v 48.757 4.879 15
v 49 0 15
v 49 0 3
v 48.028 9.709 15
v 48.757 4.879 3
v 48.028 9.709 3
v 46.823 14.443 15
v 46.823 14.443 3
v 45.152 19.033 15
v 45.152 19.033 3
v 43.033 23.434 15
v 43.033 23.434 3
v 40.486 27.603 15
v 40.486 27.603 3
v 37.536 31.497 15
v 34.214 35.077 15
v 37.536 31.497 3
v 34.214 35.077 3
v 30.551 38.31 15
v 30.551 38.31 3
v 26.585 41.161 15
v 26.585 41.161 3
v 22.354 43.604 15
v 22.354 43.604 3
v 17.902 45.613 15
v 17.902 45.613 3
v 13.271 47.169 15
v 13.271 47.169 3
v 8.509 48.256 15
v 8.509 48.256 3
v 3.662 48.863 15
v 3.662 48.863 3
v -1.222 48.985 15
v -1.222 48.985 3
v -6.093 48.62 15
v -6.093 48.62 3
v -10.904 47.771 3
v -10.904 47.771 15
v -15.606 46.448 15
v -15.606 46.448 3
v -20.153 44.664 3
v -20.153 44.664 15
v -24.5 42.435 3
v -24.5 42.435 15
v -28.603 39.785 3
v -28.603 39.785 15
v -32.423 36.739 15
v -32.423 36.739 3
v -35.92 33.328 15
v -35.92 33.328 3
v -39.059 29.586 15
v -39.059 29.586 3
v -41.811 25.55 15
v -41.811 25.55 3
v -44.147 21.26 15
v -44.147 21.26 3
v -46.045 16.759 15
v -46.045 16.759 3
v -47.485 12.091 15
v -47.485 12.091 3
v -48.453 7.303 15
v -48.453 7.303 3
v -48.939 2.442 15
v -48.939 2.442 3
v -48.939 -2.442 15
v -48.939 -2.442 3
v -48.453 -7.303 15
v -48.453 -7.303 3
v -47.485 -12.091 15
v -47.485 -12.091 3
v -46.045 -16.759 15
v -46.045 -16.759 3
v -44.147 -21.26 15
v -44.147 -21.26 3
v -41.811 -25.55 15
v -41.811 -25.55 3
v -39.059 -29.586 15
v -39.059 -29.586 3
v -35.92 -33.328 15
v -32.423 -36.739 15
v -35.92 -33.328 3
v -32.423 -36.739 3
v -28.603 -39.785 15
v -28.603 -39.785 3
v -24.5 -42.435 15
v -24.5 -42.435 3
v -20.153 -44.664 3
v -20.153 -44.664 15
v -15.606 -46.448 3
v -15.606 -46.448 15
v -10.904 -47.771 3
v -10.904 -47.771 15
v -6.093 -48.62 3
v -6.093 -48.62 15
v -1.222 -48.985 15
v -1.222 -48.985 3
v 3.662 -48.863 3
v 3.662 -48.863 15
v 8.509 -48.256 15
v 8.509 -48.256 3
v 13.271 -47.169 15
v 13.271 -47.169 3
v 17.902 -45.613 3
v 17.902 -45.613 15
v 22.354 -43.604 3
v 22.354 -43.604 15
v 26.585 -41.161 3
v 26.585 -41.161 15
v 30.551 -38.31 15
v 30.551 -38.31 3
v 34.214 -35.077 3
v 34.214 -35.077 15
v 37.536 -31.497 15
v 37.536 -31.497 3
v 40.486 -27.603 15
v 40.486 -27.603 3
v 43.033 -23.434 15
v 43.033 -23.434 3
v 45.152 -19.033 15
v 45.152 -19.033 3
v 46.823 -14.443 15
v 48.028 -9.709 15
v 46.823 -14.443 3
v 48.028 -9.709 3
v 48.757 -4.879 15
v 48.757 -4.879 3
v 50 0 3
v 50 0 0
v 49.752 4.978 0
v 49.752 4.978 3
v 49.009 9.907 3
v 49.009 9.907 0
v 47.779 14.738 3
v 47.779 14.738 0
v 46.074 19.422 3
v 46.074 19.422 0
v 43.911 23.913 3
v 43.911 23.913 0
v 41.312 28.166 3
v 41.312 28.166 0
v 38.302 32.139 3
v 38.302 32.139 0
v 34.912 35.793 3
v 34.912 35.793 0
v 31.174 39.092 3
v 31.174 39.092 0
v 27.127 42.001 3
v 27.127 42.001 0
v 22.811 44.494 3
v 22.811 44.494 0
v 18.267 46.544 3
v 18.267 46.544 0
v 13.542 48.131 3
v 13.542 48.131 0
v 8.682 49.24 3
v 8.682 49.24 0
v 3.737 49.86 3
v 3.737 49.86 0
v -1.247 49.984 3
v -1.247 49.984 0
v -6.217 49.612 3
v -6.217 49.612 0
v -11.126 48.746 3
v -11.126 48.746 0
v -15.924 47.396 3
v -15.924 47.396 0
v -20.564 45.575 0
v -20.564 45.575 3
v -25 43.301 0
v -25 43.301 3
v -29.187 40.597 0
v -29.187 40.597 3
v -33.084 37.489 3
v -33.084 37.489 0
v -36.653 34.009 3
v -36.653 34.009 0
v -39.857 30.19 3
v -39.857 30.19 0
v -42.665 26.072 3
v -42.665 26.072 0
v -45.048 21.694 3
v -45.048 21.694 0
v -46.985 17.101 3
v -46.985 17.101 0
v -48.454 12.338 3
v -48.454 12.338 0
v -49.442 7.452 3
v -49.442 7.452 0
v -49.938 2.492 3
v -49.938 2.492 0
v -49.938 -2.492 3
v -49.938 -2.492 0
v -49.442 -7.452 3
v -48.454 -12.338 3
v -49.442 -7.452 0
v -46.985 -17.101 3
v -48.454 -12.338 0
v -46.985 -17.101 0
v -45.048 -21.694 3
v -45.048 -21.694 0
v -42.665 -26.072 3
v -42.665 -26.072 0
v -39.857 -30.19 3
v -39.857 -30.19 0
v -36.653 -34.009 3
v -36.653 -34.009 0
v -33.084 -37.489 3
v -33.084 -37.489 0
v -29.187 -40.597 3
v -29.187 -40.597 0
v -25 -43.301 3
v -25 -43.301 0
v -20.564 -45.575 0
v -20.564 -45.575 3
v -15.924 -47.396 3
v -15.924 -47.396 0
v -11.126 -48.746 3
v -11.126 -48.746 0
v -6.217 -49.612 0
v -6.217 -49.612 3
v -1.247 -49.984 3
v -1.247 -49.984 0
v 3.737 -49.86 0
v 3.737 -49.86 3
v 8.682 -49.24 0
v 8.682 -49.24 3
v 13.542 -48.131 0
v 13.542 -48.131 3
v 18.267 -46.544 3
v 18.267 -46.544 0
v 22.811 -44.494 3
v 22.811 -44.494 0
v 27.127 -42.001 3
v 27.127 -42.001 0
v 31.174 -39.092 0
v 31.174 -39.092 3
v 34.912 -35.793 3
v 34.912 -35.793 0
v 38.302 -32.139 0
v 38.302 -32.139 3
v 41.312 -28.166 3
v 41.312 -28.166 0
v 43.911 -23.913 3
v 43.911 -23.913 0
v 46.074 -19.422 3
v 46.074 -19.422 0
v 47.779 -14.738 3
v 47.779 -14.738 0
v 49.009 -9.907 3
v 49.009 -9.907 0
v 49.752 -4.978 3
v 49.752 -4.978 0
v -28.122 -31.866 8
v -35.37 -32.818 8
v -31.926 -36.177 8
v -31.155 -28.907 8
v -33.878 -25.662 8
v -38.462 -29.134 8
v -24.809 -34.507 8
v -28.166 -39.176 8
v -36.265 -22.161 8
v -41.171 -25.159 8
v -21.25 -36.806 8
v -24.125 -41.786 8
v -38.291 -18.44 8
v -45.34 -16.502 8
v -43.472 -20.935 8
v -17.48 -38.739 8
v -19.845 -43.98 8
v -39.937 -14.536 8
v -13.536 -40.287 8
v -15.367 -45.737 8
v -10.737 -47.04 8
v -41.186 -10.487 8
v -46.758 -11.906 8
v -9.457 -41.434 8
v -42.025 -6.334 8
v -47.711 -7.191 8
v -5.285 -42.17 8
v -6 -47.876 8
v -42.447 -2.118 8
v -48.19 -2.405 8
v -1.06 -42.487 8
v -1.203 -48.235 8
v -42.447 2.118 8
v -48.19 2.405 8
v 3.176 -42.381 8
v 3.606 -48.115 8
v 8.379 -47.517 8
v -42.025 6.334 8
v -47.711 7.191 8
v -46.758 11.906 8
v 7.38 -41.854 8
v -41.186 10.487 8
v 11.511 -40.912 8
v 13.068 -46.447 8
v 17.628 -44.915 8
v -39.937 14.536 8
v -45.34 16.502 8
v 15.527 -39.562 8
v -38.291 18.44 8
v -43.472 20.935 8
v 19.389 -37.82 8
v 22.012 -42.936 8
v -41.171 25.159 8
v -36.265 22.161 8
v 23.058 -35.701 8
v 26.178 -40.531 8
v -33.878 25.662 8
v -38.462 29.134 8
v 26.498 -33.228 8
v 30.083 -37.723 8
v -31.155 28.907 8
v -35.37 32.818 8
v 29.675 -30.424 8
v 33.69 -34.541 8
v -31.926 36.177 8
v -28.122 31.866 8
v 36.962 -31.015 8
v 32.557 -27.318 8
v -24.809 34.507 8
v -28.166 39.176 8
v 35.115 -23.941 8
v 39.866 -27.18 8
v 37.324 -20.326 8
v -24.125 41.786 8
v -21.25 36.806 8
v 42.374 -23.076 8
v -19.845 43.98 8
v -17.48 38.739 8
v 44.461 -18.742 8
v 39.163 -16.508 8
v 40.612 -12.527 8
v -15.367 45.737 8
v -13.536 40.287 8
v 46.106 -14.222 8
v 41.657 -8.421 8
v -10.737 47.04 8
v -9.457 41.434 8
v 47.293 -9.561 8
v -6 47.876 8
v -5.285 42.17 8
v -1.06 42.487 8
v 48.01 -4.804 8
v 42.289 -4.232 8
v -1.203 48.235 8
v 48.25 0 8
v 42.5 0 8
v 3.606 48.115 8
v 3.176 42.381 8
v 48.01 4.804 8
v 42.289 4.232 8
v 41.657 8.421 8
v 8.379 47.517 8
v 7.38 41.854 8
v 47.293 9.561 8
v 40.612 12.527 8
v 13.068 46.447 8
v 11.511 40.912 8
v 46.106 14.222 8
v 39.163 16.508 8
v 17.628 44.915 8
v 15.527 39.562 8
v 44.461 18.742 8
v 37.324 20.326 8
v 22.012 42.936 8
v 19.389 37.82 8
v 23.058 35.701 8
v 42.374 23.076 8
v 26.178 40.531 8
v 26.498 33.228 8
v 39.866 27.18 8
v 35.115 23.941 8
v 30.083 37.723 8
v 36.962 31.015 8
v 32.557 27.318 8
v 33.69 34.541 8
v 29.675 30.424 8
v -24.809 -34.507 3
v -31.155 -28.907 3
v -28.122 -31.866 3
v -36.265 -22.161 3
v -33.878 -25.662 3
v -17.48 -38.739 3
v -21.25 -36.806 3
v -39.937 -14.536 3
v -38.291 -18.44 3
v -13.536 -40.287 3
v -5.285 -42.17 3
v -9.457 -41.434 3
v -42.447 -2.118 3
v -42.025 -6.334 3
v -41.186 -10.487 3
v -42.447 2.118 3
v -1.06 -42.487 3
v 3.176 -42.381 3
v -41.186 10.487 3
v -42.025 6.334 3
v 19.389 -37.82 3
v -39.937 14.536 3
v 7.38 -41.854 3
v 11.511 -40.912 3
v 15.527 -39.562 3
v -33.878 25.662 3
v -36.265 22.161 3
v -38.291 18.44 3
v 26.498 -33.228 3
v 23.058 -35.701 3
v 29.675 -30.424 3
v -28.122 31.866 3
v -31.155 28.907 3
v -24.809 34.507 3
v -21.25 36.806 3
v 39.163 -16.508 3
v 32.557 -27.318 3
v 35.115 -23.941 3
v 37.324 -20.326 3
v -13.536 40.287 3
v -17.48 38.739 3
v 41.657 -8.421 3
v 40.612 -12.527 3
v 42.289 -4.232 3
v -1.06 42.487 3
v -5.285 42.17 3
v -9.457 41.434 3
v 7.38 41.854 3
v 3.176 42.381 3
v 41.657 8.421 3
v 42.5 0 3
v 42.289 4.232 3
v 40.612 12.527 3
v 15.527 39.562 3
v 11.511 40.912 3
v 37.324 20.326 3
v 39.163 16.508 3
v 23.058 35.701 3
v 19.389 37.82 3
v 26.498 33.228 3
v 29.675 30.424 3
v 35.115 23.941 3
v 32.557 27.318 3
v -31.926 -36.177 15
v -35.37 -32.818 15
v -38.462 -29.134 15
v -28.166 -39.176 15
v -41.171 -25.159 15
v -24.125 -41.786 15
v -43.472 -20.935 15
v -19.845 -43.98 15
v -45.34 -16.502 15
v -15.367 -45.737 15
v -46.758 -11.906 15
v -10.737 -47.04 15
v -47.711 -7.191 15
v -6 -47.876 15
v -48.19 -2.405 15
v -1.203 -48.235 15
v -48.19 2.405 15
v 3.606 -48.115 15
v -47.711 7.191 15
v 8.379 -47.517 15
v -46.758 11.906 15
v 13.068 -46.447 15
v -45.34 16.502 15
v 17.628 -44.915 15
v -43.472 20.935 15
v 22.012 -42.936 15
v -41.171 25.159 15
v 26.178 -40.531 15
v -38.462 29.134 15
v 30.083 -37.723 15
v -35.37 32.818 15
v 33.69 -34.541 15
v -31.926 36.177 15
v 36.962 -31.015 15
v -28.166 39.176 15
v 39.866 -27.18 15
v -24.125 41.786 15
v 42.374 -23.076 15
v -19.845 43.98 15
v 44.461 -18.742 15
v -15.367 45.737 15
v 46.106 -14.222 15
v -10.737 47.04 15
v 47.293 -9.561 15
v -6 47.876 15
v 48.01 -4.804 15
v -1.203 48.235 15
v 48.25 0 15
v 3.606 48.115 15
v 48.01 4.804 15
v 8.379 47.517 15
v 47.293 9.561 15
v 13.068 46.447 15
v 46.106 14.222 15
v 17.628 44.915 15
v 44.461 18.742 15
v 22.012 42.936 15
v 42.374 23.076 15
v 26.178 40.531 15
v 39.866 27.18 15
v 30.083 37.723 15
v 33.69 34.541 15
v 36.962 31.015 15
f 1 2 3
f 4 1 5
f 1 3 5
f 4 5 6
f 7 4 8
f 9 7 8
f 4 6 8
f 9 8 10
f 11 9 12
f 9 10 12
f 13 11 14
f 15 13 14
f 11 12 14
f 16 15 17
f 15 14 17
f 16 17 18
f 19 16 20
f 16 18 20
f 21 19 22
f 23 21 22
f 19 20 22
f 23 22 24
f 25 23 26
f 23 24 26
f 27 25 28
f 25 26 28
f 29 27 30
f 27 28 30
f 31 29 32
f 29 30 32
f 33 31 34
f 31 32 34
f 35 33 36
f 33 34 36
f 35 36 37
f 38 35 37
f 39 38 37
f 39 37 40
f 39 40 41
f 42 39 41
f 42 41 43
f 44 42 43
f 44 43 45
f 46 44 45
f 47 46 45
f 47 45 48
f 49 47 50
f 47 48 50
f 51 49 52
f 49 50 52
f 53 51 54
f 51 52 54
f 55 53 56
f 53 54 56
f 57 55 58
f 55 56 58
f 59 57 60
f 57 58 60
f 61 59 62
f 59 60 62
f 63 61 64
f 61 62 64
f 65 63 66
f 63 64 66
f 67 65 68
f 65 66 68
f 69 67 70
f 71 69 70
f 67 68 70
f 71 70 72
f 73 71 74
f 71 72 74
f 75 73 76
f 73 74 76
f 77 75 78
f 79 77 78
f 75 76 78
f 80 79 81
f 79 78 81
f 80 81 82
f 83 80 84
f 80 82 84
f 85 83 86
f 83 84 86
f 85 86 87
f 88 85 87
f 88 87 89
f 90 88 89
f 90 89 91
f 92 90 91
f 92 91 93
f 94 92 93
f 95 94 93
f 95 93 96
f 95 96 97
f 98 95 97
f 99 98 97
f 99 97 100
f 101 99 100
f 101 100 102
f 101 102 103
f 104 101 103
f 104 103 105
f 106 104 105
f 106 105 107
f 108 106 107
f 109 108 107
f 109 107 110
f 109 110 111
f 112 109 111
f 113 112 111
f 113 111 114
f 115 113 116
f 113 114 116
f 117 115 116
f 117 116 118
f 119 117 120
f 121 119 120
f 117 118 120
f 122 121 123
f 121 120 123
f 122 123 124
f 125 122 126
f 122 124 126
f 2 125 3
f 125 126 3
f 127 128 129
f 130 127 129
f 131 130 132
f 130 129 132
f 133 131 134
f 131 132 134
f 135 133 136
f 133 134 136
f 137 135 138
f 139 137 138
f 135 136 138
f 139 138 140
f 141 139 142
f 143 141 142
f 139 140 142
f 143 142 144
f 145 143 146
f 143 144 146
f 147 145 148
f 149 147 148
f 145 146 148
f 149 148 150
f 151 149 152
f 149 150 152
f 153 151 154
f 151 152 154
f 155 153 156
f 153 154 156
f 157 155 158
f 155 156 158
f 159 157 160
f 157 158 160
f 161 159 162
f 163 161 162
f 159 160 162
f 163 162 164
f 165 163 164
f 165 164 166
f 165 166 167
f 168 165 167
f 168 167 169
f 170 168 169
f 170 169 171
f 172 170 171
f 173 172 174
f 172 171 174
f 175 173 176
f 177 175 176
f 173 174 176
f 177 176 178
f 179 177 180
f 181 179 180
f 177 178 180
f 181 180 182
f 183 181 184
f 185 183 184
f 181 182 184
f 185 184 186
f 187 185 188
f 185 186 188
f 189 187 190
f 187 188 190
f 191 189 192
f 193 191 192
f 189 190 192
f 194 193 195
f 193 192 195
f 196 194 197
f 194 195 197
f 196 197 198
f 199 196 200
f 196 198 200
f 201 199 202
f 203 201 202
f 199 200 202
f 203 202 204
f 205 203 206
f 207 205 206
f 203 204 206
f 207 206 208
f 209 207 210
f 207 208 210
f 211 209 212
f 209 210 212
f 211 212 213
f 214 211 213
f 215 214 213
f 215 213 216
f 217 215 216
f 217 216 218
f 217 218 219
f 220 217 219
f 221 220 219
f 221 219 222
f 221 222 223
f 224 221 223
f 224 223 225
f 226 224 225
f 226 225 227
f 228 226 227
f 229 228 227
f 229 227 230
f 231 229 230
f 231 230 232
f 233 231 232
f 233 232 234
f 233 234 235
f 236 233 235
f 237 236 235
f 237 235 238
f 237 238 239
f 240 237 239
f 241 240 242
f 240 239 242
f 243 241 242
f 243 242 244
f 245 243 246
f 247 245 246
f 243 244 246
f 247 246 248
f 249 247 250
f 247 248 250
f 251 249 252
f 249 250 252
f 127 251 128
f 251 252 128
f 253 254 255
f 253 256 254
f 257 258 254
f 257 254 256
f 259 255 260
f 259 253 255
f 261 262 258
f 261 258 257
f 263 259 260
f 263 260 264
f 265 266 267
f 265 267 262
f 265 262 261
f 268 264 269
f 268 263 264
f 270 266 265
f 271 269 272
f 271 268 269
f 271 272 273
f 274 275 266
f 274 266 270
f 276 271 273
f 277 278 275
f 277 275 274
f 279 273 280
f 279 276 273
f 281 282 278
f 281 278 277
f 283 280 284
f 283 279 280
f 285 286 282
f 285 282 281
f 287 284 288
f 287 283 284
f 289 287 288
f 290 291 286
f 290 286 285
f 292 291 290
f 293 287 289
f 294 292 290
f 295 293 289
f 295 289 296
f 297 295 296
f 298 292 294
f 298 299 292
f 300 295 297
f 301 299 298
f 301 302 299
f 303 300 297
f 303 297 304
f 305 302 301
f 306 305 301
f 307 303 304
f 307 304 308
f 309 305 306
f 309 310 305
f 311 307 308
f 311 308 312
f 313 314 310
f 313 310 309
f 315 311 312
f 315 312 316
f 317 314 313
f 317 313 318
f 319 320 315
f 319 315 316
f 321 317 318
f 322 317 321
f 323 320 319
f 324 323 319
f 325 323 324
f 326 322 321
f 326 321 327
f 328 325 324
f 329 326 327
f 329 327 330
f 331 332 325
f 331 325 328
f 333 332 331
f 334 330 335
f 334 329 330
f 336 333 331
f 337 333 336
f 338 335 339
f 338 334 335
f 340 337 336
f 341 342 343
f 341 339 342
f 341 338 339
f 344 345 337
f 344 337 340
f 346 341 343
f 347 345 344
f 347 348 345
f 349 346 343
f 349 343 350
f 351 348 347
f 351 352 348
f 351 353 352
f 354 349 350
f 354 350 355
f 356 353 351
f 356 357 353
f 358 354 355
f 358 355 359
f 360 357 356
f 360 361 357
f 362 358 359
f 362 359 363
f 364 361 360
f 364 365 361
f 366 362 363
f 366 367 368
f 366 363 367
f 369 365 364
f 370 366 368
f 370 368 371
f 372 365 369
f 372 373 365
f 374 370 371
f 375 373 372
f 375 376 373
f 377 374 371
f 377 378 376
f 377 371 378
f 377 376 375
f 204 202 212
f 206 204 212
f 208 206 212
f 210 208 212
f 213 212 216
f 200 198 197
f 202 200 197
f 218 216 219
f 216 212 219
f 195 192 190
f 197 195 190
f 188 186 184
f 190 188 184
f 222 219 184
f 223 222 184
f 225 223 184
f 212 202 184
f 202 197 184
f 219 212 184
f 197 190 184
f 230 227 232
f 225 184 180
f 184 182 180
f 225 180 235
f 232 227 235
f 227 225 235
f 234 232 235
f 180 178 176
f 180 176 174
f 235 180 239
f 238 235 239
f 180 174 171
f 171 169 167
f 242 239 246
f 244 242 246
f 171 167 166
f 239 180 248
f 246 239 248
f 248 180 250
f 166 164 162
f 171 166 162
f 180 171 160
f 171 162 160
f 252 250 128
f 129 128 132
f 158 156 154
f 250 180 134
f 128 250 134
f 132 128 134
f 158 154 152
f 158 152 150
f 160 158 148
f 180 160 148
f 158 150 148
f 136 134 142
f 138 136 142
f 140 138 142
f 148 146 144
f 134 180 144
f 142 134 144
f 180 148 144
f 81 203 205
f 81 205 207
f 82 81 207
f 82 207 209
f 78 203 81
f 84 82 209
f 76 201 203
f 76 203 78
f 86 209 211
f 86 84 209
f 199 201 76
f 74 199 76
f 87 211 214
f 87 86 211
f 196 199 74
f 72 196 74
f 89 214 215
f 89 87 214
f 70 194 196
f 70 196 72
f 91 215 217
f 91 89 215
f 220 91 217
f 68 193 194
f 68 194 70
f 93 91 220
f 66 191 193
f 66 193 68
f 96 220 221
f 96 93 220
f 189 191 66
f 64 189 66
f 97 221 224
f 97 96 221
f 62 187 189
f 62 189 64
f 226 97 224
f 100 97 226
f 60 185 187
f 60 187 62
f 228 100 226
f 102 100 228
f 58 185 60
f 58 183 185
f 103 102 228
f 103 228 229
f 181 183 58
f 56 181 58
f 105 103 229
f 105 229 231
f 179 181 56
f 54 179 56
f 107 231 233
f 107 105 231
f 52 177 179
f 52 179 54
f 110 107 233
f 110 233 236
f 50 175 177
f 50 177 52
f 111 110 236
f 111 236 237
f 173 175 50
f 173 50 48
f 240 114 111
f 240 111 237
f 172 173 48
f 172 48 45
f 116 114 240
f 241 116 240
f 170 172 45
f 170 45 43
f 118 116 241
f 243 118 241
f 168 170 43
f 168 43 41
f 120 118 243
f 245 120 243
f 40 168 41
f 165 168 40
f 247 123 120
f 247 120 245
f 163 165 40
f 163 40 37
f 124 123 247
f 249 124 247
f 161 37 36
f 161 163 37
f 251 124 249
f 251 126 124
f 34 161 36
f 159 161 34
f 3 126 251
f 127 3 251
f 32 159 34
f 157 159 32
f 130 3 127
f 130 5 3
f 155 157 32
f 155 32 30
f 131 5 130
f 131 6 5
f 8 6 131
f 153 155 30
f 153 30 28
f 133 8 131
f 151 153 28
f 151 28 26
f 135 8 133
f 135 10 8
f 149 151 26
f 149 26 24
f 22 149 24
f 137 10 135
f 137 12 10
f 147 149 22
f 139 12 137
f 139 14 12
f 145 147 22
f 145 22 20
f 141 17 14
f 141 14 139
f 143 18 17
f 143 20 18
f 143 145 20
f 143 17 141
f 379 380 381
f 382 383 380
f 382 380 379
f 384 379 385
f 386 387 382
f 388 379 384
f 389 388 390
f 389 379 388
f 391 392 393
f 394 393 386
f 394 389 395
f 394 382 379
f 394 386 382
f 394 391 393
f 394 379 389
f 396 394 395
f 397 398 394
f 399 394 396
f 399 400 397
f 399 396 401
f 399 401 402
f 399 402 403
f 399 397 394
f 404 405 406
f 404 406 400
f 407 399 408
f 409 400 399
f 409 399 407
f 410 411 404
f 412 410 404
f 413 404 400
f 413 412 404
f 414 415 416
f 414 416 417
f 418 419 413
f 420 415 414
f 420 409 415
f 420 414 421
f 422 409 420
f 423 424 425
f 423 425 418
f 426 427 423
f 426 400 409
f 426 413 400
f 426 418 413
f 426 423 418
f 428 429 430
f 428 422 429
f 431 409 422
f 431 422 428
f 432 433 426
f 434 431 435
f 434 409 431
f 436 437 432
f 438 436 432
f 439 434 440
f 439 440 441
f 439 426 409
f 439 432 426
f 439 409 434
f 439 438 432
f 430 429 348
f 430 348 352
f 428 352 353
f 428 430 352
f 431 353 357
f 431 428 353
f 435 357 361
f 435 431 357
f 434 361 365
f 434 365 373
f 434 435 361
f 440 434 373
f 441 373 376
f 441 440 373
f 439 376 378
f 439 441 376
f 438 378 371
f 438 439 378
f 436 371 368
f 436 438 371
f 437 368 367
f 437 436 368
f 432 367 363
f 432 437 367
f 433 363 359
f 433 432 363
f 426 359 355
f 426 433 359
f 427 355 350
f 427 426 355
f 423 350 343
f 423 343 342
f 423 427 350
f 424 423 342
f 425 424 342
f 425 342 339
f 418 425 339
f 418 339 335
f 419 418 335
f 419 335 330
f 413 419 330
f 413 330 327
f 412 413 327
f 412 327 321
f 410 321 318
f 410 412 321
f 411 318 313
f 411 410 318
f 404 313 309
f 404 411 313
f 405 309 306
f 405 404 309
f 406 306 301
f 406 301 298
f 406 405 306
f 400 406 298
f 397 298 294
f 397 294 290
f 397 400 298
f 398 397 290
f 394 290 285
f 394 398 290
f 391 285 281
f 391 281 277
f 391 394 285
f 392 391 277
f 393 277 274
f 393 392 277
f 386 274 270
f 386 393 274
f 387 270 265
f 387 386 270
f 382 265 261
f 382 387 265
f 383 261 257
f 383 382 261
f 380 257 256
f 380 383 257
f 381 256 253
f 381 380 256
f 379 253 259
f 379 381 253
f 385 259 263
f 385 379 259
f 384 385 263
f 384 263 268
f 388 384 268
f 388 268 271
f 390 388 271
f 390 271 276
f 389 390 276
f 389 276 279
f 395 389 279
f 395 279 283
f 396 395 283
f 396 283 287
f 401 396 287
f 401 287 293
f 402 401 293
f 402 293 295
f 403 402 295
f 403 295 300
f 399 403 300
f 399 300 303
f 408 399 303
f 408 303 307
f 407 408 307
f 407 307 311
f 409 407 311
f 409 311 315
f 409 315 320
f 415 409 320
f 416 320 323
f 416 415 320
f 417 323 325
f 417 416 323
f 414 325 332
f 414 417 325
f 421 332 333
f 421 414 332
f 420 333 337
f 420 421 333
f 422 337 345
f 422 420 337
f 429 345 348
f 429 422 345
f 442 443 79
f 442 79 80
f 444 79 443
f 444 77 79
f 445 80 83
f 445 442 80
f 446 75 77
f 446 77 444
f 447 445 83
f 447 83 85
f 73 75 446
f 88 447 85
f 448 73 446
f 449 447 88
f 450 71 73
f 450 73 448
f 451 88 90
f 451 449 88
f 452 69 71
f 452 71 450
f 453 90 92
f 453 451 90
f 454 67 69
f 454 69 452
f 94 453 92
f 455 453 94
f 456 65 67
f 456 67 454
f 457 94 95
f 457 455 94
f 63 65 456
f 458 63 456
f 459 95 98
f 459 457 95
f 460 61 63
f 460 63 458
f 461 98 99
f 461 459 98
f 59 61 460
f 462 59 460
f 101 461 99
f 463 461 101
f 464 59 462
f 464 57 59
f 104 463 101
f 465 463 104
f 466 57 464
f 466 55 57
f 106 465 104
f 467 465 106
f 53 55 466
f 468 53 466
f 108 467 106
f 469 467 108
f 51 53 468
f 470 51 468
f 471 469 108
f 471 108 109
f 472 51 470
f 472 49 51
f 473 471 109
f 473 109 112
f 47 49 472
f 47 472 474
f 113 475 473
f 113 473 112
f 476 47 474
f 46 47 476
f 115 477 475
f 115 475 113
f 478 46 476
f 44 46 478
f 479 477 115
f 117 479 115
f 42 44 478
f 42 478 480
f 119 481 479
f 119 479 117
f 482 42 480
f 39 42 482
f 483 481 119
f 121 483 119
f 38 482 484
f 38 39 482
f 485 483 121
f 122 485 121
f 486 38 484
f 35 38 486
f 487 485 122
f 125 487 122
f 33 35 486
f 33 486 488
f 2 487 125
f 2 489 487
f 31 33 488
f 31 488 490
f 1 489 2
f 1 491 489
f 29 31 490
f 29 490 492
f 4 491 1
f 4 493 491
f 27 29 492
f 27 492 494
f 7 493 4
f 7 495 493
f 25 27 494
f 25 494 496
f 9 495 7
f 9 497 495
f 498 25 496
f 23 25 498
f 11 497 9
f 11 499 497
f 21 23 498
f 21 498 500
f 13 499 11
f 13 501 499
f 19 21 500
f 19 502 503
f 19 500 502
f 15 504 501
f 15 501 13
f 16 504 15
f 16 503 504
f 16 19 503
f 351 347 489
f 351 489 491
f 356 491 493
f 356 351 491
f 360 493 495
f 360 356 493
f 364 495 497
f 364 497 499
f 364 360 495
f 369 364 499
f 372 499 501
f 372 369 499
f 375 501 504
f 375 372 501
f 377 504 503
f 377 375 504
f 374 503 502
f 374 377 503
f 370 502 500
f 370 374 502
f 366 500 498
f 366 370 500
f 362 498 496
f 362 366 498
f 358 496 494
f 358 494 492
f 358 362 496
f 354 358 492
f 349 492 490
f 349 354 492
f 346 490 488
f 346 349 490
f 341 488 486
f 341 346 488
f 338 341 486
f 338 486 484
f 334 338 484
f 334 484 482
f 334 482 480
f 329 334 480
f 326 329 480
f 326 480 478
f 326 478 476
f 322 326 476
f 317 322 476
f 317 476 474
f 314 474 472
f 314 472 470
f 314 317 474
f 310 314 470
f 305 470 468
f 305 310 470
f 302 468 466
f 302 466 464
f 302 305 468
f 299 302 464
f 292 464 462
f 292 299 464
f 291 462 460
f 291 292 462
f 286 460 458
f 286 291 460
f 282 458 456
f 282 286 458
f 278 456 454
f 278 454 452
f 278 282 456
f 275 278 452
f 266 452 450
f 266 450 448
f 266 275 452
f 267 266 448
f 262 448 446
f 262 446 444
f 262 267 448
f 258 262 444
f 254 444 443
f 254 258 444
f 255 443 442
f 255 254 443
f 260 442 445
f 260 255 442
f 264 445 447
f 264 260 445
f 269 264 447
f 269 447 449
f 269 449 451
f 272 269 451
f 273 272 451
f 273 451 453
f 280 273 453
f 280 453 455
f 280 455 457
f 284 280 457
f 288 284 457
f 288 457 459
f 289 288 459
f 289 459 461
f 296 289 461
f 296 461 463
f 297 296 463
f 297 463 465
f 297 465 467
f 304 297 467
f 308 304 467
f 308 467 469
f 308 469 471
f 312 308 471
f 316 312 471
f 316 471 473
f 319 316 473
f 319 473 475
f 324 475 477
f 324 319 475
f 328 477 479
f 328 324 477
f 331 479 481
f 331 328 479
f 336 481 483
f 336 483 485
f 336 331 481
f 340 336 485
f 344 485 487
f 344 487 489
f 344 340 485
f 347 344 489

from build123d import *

# Parameters (mm, degrees)
F0_R     = 50
F1_DEPTH = 3
F2_R     = 49
F2_R_2   = 42.5
F3_DEPTH = 5
F4_R     = 49
F4_R_2   = 48.25
F5_DEPTH = 7


with BuildPart() as f1:
    # F0 (on Top) → F1 (new body)
    with BuildSketch(Plane.XY):
        Circle(F0_R)
    extrude(amount=F1_DEPTH)

    # F2 (on face) → F3 (join)
    with BuildSketch(Plane.XY.offset(3)):
        Circle(F2_R)
        Circle(F2_R_2, mode=Mode.SUBTRACT)
    extrude(amount=F3_DEPTH)

    # F4 (on face) → F5 (join)
    with BuildSketch(Plane.XY.offset(8)):
        Circle(F4_R)
        Circle(F4_R_2, mode=Mode.SUBTRACT)
    extrude(amount=F5_DEPTH)


solid = f1.part
